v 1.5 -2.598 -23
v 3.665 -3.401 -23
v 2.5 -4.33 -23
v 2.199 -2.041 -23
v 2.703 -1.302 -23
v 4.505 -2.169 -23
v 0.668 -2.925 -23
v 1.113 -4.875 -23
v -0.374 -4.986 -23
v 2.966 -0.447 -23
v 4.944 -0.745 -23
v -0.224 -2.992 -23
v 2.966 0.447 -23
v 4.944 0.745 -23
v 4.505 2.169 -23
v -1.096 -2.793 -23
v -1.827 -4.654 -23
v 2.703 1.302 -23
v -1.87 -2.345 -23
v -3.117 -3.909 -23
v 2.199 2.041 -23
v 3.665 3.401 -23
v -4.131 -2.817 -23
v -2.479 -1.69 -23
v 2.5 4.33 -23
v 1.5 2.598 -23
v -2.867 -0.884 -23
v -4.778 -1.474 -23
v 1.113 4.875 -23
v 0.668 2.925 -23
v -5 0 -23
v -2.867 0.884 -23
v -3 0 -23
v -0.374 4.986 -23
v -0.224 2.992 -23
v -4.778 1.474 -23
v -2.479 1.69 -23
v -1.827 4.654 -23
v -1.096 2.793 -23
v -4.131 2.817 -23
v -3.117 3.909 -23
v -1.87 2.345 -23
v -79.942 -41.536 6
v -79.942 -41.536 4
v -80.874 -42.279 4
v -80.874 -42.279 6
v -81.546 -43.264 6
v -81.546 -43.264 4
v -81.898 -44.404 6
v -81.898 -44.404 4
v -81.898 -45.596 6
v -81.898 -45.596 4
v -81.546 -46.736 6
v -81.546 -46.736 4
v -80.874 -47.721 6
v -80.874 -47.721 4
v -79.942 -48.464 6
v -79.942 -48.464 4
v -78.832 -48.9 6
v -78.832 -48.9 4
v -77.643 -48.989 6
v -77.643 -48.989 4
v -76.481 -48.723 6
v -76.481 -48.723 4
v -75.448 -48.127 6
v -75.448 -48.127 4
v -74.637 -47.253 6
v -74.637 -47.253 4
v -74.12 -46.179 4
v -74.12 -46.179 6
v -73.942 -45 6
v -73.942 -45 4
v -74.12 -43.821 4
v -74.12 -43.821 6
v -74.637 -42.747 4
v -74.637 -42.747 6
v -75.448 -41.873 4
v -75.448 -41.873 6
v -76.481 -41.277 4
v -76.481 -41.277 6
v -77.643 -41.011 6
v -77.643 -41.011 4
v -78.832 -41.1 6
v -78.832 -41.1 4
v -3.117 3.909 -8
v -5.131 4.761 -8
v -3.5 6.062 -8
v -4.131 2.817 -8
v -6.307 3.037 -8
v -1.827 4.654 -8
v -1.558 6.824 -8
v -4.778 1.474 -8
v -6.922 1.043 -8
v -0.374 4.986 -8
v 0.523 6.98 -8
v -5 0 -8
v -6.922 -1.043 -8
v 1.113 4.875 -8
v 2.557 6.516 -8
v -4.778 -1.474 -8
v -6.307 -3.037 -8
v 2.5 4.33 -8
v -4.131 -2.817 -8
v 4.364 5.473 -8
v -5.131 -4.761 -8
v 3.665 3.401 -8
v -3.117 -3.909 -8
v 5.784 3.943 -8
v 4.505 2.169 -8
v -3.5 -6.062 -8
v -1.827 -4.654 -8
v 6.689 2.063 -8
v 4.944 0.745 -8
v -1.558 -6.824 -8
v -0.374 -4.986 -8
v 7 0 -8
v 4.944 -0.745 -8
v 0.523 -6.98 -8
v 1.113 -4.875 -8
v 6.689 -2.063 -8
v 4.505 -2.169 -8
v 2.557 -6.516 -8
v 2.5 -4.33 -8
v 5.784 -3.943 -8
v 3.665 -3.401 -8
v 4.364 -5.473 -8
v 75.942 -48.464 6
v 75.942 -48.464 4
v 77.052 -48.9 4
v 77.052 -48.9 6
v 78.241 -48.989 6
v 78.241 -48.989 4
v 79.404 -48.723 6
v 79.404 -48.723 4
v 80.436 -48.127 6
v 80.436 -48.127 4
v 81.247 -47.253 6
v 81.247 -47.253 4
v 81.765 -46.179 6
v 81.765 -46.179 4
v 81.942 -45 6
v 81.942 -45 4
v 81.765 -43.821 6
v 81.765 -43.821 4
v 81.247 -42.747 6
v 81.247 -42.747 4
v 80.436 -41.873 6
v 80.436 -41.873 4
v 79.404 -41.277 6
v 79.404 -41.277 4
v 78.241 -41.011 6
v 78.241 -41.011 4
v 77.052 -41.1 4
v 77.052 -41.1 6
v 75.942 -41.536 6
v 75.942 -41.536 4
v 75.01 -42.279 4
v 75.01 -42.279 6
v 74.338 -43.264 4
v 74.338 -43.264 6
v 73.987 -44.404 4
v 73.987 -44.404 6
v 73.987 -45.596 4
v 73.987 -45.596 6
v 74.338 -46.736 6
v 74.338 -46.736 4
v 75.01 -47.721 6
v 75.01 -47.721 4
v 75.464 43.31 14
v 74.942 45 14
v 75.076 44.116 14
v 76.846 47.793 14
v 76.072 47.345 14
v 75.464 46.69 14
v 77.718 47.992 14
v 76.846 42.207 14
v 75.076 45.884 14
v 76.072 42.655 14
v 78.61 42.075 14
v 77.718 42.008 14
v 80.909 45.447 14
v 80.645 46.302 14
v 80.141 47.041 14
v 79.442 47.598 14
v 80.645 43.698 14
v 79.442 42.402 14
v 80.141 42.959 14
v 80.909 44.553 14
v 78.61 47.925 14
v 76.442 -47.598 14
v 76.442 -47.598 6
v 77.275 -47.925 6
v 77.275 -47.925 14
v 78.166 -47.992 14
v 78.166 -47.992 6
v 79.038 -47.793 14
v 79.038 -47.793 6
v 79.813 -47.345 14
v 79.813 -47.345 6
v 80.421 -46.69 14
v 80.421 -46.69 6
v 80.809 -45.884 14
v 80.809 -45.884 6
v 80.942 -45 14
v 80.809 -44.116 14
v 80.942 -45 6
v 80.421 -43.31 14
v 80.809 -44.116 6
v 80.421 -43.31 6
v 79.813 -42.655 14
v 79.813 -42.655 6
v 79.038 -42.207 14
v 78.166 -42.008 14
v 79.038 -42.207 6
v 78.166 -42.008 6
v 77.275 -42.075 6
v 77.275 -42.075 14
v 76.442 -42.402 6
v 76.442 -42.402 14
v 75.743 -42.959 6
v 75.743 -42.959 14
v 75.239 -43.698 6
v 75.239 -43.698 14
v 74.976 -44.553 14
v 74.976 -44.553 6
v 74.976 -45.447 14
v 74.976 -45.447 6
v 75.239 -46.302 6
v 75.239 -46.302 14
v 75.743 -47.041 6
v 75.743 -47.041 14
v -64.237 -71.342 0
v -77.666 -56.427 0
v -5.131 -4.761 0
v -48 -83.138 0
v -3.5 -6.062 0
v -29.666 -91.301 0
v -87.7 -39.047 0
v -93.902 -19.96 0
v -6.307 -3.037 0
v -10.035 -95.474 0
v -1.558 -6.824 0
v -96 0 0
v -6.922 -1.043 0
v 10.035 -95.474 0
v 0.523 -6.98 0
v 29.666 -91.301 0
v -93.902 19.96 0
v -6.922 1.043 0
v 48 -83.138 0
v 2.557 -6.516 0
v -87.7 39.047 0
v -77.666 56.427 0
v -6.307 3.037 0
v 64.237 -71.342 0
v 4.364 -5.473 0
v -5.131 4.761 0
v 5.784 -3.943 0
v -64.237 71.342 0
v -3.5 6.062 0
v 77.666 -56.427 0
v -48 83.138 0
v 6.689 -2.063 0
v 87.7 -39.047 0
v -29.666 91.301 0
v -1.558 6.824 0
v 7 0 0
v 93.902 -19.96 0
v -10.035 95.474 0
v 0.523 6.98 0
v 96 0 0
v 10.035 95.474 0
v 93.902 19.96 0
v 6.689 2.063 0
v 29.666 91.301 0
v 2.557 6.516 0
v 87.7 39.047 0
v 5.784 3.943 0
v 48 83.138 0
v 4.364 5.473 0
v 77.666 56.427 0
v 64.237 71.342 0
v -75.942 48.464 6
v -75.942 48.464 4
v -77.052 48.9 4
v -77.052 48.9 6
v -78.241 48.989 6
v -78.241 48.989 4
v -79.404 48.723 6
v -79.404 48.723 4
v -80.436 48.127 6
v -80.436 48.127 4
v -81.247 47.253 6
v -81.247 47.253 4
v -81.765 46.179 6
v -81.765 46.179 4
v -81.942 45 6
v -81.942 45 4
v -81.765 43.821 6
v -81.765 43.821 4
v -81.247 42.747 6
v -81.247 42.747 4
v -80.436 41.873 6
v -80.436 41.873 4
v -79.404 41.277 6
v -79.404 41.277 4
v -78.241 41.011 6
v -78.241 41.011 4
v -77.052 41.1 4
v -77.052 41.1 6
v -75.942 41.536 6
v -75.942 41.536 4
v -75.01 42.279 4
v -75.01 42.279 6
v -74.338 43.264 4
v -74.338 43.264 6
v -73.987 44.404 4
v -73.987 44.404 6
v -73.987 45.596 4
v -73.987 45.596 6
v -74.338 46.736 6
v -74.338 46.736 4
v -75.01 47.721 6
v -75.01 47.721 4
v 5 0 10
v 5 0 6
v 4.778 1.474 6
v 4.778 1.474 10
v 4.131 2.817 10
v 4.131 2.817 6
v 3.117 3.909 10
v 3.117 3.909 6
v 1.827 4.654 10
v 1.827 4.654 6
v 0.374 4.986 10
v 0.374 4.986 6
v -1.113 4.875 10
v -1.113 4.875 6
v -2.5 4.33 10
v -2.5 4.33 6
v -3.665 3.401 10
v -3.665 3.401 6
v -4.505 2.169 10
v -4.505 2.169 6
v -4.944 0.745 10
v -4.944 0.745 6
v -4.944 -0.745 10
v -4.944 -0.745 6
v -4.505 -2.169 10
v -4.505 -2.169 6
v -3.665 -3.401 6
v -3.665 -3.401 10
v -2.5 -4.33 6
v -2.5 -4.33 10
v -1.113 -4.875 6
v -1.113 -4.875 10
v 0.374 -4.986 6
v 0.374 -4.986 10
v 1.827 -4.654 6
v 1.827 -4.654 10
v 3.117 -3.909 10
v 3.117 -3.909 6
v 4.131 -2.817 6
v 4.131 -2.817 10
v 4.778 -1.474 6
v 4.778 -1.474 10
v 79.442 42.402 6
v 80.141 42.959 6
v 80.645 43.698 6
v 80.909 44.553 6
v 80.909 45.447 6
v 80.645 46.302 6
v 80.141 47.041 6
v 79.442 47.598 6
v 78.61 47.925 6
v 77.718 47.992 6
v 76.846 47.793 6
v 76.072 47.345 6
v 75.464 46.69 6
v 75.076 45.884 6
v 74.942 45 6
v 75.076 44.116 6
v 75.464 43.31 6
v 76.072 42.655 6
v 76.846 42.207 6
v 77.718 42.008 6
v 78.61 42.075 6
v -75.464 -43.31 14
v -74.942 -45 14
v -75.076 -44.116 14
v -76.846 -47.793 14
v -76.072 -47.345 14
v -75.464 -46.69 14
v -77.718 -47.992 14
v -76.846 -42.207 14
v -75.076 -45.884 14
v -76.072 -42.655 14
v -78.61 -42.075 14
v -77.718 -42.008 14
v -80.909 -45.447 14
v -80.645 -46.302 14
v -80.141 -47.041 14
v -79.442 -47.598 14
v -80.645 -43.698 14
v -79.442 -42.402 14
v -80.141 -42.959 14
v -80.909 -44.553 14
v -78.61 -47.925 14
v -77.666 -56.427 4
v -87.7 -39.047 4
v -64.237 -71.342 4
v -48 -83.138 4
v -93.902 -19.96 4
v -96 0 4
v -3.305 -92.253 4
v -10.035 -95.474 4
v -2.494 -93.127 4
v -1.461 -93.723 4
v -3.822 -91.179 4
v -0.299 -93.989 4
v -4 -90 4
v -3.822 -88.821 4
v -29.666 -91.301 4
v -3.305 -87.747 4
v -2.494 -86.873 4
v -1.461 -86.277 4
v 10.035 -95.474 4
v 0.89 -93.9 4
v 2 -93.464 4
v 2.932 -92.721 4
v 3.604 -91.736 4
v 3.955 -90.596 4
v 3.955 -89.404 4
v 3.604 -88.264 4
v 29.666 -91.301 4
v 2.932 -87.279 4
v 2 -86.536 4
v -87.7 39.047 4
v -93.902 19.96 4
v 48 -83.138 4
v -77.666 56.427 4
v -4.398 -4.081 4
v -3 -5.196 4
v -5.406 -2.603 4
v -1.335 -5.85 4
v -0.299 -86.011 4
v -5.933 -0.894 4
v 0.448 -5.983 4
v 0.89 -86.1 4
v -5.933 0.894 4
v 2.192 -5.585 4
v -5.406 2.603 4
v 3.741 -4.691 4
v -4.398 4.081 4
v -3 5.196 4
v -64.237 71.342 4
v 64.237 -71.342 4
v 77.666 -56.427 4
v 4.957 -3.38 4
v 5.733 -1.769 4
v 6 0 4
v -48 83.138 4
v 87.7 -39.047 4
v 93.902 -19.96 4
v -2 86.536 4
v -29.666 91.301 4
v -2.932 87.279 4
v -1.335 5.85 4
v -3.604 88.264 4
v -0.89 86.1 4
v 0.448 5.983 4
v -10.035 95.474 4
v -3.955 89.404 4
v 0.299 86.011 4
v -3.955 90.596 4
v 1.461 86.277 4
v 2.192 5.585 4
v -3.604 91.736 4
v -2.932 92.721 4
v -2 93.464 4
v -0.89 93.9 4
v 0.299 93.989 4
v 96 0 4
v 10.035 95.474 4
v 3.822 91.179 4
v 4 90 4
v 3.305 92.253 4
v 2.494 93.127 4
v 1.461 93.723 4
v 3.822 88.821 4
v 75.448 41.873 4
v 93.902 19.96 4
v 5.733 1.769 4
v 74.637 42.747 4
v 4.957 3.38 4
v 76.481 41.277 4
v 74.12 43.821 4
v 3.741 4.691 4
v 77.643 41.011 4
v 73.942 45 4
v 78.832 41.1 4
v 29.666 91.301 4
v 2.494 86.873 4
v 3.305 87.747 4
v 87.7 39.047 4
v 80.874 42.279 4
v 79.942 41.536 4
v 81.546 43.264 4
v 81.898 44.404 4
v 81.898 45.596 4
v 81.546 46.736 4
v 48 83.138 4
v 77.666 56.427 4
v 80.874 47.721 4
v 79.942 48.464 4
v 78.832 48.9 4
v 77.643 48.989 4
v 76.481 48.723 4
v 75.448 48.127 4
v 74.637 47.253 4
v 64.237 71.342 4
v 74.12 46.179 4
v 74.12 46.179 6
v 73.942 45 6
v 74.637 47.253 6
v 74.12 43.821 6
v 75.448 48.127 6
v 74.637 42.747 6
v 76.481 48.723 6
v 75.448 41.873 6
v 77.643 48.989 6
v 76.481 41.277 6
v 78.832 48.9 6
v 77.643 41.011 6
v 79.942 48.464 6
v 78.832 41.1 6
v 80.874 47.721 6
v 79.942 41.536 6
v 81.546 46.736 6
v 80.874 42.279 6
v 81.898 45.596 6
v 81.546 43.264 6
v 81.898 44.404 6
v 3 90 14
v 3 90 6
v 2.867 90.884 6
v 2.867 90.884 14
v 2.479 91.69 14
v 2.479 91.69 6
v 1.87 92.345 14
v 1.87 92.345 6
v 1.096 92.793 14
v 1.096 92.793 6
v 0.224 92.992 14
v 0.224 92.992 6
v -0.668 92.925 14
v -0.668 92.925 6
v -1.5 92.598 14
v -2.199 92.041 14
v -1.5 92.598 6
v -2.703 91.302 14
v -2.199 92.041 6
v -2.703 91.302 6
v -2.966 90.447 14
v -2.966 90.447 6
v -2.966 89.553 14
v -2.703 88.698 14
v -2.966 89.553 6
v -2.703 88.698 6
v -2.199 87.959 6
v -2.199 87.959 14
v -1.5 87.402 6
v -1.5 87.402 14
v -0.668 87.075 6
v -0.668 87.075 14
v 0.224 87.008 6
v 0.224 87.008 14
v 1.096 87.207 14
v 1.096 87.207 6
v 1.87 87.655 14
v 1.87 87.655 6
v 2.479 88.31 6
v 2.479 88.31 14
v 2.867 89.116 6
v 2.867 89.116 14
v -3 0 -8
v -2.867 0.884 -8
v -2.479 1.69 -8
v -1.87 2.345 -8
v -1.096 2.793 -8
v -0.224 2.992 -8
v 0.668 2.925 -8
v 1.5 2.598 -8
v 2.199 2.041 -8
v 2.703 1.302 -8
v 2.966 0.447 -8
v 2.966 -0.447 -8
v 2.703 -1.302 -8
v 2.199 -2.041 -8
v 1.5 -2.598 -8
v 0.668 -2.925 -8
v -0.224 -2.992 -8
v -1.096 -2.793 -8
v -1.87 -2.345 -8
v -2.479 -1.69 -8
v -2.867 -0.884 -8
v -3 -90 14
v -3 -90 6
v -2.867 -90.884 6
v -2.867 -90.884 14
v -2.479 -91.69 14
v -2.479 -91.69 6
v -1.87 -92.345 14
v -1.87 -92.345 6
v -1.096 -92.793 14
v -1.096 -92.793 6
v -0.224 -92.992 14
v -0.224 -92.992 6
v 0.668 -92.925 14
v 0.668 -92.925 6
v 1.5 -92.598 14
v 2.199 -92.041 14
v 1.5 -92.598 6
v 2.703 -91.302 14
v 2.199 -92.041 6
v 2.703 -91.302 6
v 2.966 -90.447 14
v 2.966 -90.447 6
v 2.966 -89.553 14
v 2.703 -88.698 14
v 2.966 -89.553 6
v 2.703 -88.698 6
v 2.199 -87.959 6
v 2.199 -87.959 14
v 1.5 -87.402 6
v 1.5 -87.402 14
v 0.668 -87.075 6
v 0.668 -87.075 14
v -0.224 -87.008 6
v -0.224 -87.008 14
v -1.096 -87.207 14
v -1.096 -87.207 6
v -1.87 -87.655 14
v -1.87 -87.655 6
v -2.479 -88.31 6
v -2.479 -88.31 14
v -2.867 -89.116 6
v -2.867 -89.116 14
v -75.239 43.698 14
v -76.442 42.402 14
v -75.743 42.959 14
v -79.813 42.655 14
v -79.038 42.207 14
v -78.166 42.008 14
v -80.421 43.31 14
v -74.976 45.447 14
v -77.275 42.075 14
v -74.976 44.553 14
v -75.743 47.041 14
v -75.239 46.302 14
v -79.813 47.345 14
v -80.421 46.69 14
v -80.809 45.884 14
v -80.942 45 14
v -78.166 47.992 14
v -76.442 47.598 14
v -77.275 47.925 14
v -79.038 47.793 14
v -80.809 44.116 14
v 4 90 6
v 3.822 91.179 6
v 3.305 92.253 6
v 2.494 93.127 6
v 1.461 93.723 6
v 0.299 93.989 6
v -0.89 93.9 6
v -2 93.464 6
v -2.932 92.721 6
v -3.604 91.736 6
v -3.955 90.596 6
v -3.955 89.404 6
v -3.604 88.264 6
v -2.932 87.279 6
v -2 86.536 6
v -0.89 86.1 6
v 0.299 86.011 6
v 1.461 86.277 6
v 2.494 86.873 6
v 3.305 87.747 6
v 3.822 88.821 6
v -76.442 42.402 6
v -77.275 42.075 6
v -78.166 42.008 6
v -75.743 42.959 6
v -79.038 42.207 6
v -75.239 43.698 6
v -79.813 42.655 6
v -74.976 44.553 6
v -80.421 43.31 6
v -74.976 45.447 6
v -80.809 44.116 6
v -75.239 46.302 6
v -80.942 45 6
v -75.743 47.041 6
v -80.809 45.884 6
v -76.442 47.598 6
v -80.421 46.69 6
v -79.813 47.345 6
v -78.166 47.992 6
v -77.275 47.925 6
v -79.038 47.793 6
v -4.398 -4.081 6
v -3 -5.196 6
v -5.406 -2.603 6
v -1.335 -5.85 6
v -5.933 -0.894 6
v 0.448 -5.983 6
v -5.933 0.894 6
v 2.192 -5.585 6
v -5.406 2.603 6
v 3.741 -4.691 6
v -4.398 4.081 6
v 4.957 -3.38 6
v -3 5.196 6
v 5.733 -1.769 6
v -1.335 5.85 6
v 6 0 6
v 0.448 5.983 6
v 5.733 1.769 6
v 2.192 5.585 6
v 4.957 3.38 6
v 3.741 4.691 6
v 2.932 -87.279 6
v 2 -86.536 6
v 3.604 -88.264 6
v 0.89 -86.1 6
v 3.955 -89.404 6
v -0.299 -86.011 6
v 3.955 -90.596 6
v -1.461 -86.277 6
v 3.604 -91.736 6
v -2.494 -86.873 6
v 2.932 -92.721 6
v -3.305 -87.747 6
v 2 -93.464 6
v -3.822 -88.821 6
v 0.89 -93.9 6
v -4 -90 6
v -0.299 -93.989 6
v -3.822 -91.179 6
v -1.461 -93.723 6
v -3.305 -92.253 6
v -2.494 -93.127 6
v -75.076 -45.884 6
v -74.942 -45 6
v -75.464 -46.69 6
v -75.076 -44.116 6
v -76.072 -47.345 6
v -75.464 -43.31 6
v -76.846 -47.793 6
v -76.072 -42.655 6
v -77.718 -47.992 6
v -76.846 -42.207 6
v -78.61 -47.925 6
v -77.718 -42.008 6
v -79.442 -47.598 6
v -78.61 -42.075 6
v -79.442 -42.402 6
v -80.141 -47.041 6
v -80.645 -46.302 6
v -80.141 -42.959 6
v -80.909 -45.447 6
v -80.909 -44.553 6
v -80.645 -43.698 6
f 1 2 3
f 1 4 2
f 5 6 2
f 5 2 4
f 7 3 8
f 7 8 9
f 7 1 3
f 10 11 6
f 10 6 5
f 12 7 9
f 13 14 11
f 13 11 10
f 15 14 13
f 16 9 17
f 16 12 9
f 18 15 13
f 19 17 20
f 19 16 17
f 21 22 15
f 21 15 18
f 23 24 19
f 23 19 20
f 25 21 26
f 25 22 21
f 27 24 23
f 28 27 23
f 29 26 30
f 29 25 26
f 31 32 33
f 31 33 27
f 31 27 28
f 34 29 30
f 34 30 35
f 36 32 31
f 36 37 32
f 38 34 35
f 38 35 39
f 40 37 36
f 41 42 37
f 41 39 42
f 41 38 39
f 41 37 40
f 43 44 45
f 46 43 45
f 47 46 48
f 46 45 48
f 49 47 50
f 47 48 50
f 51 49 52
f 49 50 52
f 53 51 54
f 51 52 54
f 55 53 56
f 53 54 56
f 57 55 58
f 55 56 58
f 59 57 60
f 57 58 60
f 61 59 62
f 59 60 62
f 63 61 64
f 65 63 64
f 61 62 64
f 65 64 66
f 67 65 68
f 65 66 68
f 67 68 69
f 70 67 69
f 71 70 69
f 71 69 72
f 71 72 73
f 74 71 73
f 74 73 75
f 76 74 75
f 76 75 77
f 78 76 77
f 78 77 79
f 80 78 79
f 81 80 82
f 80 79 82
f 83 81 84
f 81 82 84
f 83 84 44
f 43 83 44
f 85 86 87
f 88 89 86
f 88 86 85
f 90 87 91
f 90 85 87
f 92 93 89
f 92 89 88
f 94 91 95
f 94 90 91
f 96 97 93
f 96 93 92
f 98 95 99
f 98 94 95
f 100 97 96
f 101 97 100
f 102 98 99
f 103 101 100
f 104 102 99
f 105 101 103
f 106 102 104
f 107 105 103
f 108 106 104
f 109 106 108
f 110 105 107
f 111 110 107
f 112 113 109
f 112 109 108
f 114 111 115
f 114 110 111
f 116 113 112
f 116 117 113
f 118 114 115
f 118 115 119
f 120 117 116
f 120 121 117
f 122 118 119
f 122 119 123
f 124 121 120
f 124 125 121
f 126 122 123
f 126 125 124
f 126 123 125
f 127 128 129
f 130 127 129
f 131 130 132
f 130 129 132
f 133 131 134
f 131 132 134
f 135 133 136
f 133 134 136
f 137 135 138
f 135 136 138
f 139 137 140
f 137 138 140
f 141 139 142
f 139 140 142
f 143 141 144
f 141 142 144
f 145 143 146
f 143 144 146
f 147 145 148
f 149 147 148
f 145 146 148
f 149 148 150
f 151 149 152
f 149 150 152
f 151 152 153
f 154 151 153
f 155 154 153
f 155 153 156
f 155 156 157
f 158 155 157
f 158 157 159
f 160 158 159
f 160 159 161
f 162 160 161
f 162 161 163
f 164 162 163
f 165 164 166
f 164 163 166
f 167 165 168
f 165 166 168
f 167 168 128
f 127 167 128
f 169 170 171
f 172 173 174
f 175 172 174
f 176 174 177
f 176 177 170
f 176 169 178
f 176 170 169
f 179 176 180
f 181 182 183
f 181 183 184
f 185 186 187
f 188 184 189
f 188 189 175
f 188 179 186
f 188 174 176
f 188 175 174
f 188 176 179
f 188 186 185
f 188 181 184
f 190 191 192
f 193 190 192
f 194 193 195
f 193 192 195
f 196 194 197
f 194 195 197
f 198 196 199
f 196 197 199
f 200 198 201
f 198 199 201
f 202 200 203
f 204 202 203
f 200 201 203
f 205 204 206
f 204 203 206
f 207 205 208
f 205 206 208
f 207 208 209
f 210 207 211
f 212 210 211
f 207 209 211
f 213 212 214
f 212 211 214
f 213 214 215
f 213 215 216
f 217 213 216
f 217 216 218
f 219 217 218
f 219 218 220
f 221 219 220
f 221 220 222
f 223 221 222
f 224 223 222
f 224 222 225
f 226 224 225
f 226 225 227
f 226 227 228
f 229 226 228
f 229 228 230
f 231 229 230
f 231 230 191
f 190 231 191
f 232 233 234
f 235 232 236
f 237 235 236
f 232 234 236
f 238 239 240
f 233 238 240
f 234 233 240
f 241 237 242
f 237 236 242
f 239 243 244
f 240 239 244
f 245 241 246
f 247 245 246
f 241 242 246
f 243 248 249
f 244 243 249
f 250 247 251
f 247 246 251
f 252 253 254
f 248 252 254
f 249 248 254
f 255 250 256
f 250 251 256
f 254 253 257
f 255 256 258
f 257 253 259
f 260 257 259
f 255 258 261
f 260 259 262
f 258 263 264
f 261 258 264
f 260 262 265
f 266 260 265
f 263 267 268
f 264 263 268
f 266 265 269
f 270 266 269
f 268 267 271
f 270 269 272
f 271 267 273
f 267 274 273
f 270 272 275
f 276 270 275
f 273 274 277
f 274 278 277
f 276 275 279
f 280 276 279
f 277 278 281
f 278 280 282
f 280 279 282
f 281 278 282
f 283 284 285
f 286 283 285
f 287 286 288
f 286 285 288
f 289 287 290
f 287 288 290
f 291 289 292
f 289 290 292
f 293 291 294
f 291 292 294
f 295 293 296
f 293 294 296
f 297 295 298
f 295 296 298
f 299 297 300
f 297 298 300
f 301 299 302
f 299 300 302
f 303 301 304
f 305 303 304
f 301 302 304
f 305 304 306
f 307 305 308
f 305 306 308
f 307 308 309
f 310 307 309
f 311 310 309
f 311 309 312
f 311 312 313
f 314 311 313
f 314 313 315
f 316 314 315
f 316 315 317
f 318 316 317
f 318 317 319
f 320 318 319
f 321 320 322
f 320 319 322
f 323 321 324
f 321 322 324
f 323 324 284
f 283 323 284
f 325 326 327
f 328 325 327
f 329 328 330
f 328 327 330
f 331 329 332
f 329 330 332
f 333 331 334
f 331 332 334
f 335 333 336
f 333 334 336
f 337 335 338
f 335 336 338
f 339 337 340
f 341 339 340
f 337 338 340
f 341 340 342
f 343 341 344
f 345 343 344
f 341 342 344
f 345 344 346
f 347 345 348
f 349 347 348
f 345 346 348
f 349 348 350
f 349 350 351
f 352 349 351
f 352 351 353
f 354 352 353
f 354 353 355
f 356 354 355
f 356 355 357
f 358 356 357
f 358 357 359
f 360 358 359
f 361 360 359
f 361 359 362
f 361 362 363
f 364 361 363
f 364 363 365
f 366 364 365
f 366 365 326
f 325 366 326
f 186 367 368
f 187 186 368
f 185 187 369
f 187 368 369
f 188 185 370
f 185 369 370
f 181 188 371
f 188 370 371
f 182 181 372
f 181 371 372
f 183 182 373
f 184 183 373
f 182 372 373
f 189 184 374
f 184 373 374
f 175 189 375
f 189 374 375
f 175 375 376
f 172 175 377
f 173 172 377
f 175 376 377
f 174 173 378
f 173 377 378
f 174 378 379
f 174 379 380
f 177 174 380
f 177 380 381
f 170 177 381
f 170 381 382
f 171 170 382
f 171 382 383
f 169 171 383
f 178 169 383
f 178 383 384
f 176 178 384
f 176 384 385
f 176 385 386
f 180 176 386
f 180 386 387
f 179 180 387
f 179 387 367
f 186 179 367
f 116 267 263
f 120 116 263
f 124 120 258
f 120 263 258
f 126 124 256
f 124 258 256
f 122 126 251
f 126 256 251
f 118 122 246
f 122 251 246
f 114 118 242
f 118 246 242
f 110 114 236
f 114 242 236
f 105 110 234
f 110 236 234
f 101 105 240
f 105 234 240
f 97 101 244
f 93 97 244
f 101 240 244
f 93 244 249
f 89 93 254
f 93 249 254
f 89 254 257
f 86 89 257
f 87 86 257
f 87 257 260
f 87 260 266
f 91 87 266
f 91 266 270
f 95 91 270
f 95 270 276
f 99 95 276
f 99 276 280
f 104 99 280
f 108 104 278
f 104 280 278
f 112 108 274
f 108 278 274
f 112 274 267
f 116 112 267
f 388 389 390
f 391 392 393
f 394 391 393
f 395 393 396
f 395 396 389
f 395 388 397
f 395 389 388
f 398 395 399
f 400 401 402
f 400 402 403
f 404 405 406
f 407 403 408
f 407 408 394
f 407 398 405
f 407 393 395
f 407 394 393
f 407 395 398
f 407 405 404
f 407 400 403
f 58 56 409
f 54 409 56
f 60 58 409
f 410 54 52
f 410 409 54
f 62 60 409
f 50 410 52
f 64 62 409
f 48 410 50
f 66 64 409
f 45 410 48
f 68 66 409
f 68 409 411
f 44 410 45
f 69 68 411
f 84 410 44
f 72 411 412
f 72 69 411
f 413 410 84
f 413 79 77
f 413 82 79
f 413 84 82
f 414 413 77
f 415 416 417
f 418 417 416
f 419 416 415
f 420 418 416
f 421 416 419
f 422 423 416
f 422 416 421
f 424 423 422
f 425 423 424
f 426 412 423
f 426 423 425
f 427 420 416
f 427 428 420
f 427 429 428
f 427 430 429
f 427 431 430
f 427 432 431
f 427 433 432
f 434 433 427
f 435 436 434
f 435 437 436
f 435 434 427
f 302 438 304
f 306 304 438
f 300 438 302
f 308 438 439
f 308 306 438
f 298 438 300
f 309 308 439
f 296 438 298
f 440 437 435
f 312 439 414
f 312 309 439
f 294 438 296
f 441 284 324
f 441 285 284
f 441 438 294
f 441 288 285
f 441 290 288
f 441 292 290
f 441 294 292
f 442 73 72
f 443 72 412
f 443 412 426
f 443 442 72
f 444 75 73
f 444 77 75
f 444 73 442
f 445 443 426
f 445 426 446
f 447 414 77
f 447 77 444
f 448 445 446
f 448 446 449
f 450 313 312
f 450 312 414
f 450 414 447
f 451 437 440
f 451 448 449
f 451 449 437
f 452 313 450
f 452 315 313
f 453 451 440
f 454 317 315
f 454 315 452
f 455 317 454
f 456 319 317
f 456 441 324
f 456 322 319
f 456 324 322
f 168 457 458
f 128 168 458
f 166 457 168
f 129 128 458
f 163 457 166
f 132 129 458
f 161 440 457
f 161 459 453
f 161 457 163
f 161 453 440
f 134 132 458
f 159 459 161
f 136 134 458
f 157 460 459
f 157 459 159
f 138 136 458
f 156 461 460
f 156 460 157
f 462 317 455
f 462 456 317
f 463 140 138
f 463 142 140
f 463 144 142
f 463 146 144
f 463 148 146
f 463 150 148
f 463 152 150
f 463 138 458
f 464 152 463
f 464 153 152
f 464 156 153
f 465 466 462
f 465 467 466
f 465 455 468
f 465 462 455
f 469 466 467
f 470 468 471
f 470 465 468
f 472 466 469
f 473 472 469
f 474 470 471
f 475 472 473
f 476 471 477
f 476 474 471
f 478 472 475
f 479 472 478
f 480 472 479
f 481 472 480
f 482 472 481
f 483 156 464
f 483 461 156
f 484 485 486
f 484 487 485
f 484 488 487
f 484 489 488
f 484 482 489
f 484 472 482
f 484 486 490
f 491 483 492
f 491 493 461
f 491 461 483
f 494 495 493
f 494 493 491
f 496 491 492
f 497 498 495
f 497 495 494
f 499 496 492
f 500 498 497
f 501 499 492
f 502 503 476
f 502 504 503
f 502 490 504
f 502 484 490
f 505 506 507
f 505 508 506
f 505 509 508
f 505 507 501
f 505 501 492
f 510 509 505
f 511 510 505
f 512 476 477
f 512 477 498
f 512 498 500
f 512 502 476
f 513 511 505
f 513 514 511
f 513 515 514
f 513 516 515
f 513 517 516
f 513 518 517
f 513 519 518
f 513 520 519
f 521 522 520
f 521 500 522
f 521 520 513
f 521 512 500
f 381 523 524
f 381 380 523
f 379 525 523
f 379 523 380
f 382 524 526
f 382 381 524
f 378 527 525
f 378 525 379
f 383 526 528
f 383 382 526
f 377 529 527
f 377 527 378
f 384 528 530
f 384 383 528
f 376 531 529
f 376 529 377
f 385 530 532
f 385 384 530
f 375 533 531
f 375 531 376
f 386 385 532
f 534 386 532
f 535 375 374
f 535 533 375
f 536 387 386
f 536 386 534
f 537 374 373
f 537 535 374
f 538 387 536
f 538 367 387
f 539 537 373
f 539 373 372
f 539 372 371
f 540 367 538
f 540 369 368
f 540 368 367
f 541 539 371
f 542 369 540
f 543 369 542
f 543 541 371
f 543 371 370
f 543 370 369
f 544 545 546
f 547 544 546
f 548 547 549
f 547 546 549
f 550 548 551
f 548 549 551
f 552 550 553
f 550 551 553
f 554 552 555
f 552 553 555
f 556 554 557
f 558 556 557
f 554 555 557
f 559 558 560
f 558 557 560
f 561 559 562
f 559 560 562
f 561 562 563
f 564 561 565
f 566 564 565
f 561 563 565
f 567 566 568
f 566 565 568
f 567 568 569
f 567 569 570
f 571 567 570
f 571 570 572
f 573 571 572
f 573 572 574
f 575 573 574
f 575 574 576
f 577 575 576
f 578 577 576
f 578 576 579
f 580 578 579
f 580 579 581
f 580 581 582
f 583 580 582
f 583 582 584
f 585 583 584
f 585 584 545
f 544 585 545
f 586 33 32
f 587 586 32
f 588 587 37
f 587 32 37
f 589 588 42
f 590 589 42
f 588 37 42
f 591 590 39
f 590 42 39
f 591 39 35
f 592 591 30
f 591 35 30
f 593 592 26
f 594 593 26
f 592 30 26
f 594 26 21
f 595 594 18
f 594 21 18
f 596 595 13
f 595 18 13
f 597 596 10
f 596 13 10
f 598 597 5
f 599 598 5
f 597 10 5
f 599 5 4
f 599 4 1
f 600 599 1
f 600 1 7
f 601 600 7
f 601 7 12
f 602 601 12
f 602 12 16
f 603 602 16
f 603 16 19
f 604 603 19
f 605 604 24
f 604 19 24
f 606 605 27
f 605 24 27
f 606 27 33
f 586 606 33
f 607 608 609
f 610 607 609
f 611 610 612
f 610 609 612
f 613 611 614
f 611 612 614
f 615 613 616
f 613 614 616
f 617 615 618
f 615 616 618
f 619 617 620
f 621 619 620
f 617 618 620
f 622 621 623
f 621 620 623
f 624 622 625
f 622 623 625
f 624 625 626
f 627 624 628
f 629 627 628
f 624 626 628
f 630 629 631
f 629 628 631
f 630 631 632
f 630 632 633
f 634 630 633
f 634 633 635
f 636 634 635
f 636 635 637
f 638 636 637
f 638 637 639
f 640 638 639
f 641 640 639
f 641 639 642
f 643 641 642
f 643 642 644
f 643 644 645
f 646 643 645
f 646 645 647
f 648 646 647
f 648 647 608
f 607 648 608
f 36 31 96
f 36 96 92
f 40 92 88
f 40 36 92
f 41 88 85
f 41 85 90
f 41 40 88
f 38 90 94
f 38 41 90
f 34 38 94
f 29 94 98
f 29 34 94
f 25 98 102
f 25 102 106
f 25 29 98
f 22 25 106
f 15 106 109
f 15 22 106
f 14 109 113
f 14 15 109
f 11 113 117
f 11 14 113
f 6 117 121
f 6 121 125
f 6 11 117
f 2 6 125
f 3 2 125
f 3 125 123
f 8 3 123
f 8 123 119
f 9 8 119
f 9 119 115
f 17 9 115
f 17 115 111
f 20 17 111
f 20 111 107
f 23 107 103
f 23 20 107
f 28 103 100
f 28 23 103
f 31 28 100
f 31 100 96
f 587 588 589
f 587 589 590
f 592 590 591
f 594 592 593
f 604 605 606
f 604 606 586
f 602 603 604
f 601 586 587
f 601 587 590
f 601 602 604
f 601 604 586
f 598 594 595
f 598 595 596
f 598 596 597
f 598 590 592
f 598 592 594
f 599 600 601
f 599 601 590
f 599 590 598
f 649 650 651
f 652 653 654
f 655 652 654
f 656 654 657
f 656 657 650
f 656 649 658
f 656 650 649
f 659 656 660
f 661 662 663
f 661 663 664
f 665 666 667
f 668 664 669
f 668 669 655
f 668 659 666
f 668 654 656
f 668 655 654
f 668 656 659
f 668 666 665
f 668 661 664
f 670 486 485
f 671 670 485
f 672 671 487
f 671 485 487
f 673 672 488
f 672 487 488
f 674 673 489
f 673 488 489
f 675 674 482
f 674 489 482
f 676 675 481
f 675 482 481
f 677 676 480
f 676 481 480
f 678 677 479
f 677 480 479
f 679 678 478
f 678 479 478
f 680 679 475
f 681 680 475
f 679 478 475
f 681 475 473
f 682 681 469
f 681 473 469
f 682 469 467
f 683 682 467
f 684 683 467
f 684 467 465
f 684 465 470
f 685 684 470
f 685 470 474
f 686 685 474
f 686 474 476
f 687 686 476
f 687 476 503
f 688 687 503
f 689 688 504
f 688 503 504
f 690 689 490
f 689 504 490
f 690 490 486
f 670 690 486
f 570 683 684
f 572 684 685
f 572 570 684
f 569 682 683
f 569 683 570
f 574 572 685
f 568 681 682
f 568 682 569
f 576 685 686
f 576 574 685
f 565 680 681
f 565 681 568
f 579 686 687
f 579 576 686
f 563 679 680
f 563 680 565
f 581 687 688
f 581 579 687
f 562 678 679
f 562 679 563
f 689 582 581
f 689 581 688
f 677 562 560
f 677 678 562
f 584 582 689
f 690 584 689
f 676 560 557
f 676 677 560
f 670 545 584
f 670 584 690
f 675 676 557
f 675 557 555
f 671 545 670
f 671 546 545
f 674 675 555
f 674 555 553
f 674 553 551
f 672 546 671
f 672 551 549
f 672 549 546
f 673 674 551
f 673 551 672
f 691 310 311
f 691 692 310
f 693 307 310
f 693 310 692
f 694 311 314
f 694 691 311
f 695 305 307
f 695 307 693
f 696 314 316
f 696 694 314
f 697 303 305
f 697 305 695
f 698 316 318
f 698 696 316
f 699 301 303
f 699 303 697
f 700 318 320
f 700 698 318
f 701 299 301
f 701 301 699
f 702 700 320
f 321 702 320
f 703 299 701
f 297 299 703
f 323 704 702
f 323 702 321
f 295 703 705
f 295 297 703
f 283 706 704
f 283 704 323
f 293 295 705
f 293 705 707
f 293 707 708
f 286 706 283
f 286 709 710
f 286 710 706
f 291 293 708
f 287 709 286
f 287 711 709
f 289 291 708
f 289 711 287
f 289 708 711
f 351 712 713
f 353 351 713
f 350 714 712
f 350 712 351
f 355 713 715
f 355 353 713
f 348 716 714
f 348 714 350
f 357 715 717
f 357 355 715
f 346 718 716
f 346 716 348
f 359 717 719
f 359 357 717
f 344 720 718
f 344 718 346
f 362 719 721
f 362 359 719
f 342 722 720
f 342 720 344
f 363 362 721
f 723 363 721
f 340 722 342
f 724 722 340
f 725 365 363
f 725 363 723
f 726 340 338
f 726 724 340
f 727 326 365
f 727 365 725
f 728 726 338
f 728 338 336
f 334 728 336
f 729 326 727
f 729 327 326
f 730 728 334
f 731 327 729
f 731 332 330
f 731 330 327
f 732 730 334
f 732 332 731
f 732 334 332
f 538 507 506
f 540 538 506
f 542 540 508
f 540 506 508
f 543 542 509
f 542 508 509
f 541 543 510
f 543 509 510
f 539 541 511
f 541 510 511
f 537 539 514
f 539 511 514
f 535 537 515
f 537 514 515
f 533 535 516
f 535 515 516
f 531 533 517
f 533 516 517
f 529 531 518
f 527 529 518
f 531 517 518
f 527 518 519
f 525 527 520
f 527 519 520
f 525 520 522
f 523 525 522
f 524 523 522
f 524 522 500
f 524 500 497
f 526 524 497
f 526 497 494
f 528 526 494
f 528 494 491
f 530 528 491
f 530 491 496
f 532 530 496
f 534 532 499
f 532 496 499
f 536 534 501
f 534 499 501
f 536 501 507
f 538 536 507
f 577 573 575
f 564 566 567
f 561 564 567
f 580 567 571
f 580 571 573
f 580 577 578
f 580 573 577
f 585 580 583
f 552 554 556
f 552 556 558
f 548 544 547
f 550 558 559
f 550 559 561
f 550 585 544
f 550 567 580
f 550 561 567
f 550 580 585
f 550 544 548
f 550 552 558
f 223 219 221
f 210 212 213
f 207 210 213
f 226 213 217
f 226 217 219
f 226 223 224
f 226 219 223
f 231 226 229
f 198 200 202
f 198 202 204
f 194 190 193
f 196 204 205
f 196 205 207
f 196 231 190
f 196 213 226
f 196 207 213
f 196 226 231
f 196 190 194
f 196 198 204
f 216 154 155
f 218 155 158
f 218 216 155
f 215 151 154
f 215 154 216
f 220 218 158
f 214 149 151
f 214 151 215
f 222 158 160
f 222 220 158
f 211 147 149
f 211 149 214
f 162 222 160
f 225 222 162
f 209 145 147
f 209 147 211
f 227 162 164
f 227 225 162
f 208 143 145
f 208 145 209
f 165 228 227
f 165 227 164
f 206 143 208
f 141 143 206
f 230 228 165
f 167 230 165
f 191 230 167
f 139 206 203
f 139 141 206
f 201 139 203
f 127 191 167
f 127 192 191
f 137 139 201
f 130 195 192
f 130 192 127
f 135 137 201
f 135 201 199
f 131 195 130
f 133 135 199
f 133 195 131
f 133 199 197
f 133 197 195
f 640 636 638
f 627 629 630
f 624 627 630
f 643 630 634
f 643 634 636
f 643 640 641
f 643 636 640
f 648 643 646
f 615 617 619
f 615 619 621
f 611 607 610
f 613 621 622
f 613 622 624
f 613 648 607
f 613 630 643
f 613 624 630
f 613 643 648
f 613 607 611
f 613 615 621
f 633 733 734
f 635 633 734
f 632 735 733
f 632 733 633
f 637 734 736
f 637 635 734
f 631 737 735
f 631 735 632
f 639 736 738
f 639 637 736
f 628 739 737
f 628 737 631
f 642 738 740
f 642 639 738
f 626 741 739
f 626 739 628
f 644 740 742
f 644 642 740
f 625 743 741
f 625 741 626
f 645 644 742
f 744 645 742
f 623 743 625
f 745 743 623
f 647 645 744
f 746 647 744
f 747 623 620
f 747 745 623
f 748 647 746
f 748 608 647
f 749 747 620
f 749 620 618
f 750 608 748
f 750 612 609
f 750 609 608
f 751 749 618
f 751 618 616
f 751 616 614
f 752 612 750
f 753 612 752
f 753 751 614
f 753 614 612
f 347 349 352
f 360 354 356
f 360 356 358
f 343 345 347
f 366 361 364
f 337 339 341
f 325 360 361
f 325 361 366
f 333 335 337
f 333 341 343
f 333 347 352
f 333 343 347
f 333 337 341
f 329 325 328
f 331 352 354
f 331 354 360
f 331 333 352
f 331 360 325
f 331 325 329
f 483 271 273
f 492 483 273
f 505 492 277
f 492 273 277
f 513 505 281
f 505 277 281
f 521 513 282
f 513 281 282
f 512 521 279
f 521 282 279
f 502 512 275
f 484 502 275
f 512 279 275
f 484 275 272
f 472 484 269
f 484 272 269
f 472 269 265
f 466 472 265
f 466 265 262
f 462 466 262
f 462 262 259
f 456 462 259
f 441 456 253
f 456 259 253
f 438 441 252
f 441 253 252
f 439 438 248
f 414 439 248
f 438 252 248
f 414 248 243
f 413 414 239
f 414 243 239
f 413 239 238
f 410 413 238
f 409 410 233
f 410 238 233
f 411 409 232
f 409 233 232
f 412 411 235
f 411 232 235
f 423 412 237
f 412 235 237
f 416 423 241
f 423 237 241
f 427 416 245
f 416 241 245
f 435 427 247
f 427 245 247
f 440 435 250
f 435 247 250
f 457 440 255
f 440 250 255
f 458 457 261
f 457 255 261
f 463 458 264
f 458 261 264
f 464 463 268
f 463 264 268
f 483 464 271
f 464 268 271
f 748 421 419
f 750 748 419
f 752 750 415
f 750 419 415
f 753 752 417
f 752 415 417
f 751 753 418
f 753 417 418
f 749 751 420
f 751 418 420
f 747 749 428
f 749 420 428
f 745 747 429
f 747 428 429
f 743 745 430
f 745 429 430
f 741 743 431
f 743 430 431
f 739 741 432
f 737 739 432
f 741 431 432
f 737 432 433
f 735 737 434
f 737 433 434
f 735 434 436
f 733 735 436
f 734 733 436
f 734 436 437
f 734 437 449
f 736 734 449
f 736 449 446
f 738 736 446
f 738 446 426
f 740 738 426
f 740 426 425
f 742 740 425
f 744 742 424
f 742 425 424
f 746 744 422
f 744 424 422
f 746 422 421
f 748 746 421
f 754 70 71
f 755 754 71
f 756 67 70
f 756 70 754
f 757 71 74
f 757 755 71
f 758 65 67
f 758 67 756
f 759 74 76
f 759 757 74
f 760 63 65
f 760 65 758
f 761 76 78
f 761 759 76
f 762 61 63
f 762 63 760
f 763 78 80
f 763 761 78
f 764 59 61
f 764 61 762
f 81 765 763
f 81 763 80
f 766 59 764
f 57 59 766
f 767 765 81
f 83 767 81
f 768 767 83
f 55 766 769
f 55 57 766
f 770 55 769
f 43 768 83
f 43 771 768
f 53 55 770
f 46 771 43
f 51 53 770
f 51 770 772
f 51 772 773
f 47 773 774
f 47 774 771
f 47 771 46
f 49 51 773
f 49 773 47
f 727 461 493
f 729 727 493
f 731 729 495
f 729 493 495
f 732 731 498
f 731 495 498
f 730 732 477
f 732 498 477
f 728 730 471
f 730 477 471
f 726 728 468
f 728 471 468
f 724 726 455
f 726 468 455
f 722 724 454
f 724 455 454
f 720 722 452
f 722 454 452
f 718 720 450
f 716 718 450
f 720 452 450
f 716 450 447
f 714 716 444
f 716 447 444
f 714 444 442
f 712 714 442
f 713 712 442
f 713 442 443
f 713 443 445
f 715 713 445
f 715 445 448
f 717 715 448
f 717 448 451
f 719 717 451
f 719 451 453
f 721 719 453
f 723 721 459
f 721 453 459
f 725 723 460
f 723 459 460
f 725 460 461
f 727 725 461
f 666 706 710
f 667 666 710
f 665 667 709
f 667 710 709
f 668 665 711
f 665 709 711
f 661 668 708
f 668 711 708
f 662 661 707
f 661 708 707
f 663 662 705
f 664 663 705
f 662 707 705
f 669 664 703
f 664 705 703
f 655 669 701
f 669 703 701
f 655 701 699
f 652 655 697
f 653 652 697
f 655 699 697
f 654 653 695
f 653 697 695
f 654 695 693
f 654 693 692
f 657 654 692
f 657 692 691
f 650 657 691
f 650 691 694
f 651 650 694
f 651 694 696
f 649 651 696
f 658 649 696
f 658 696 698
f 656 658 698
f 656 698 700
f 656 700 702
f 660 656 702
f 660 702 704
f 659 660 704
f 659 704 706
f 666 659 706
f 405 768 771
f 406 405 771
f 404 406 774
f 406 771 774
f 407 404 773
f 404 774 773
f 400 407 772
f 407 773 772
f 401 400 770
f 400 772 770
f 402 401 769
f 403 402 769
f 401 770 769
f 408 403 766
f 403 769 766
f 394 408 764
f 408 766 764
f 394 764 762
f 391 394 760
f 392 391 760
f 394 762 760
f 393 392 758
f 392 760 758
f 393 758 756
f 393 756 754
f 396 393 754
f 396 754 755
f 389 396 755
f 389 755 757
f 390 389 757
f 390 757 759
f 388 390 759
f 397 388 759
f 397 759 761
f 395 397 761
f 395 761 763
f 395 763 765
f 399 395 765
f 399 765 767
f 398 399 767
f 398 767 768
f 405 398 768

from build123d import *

# Parameters (mm, degrees)
SKETCH_1_R               = 96
EXTRUDE_1_DEPTH          = 4
SKETCH_2_R               = 5
EXTRUDE_2_DEPTH          = 6
SKETCH_3_R               = 3
EXTRUDE_3_DEPTH          = 10
PATTERN_CIRCULAR_1_COUNT = 6
SKETCH_4_R               = 6
EXTRUDE_4_DEPTH          = 2
SKETCH_5_R               = 4
EXTRUDE_5_DEPTH          = 2
PATTERN_CIRCULAR_2_COUNT = 6
SKETCH_6_R               = 7
EXTRUDE_6_DEPTH          = 8
EXTRUDE_START            = 15
SKETCH_7_R               = 5
SKETCH_7_R_2             = 3
EXTRUDE_1_2_DEPTH        = 15


with BuildPart() as part:
    # 草图1 → Extrude 1 (new body)
    with BuildSketch(Plane.XY):
        Circle(SKETCH_1_R)
    extrude(amount=EXTRUDE_1_DEPTH)

    # 草图2 → 凸台-拉伸2 (add)
    with BuildSketch(Plane.XY.offset(4)):
        Circle(SKETCH_2_R)
    extrude(amount=EXTRUDE_2_DEPTH)

    # 草图3 → 凸台-拉伸3 (add)
    with BuildSketch(Plane.XY.offset(4)):
        with Locations((0, 90)):
            Circle(SKETCH_3_R)
    extrude_3 = extrude(amount=EXTRUDE_3_DEPTH)

    # 阵列(圆周)1: 凸台-拉伸3 ×6 about axis
    pattern_circular_1_axis = Axis((0, 0, 0), (0, 0, 1))
    for i in range(1, PATTERN_CIRCULAR_1_COUNT):
        add(extrude_3.rotate(pattern_circular_1_axis, i * 360 / PATTERN_CIRCULAR_1_COUNT))

    # 草图4 → 凸台-拉伸4 (add)
    with BuildSketch(Plane.XY.offset(4)):
        Circle(SKETCH_4_R)
    extrude(amount=EXTRUDE_4_DEPTH)

    # 草图5 → 凸台-拉伸5 (add)
    with BuildSketch(Plane.XY.offset(4)):
        with Locations((0, 90)):
            Circle(SKETCH_5_R)
    extrude_5 = extrude(amount=EXTRUDE_5_DEPTH)

    # 阵列(圆周)2: 凸台-拉伸5 ×6 about axis
    pattern_circular_2_axis = Axis((0, 0, 0), (0, 0, 1))
    for i in range(1, PATTERN_CIRCULAR_2_COUNT):
        add(extrude_5.rotate(pattern_circular_2_axis, i * 360 / PATTERN_CIRCULAR_2_COUNT))

    # 草图6 → 凸台-拉伸6 (add)
    with BuildSketch(Plane(origin=(0, 0, 0), x_dir=(-1, 0, 0), z_dir=(0, 0, -1))):
        with Locations(Location((0, 0, 0), (0, 0, 180))):
            Circle(SKETCH_6_R)
    extrude(amount=EXTRUDE_6_DEPTH)

    # 草图7 → Extrude 1 2 (add)
    with BuildSketch(Plane(origin=(0, 0, -8), x_dir=(-1, 0, 0), z_dir=(0, 0, -1)).offset(EXTRUDE_START)):
        Circle(SKETCH_7_R)
        Circle(SKETCH_7_R_2, mode=Mode.SUBTRACT)
    extrude(amount=-EXTRUDE_1_2_DEPTH)


solid = part.part
